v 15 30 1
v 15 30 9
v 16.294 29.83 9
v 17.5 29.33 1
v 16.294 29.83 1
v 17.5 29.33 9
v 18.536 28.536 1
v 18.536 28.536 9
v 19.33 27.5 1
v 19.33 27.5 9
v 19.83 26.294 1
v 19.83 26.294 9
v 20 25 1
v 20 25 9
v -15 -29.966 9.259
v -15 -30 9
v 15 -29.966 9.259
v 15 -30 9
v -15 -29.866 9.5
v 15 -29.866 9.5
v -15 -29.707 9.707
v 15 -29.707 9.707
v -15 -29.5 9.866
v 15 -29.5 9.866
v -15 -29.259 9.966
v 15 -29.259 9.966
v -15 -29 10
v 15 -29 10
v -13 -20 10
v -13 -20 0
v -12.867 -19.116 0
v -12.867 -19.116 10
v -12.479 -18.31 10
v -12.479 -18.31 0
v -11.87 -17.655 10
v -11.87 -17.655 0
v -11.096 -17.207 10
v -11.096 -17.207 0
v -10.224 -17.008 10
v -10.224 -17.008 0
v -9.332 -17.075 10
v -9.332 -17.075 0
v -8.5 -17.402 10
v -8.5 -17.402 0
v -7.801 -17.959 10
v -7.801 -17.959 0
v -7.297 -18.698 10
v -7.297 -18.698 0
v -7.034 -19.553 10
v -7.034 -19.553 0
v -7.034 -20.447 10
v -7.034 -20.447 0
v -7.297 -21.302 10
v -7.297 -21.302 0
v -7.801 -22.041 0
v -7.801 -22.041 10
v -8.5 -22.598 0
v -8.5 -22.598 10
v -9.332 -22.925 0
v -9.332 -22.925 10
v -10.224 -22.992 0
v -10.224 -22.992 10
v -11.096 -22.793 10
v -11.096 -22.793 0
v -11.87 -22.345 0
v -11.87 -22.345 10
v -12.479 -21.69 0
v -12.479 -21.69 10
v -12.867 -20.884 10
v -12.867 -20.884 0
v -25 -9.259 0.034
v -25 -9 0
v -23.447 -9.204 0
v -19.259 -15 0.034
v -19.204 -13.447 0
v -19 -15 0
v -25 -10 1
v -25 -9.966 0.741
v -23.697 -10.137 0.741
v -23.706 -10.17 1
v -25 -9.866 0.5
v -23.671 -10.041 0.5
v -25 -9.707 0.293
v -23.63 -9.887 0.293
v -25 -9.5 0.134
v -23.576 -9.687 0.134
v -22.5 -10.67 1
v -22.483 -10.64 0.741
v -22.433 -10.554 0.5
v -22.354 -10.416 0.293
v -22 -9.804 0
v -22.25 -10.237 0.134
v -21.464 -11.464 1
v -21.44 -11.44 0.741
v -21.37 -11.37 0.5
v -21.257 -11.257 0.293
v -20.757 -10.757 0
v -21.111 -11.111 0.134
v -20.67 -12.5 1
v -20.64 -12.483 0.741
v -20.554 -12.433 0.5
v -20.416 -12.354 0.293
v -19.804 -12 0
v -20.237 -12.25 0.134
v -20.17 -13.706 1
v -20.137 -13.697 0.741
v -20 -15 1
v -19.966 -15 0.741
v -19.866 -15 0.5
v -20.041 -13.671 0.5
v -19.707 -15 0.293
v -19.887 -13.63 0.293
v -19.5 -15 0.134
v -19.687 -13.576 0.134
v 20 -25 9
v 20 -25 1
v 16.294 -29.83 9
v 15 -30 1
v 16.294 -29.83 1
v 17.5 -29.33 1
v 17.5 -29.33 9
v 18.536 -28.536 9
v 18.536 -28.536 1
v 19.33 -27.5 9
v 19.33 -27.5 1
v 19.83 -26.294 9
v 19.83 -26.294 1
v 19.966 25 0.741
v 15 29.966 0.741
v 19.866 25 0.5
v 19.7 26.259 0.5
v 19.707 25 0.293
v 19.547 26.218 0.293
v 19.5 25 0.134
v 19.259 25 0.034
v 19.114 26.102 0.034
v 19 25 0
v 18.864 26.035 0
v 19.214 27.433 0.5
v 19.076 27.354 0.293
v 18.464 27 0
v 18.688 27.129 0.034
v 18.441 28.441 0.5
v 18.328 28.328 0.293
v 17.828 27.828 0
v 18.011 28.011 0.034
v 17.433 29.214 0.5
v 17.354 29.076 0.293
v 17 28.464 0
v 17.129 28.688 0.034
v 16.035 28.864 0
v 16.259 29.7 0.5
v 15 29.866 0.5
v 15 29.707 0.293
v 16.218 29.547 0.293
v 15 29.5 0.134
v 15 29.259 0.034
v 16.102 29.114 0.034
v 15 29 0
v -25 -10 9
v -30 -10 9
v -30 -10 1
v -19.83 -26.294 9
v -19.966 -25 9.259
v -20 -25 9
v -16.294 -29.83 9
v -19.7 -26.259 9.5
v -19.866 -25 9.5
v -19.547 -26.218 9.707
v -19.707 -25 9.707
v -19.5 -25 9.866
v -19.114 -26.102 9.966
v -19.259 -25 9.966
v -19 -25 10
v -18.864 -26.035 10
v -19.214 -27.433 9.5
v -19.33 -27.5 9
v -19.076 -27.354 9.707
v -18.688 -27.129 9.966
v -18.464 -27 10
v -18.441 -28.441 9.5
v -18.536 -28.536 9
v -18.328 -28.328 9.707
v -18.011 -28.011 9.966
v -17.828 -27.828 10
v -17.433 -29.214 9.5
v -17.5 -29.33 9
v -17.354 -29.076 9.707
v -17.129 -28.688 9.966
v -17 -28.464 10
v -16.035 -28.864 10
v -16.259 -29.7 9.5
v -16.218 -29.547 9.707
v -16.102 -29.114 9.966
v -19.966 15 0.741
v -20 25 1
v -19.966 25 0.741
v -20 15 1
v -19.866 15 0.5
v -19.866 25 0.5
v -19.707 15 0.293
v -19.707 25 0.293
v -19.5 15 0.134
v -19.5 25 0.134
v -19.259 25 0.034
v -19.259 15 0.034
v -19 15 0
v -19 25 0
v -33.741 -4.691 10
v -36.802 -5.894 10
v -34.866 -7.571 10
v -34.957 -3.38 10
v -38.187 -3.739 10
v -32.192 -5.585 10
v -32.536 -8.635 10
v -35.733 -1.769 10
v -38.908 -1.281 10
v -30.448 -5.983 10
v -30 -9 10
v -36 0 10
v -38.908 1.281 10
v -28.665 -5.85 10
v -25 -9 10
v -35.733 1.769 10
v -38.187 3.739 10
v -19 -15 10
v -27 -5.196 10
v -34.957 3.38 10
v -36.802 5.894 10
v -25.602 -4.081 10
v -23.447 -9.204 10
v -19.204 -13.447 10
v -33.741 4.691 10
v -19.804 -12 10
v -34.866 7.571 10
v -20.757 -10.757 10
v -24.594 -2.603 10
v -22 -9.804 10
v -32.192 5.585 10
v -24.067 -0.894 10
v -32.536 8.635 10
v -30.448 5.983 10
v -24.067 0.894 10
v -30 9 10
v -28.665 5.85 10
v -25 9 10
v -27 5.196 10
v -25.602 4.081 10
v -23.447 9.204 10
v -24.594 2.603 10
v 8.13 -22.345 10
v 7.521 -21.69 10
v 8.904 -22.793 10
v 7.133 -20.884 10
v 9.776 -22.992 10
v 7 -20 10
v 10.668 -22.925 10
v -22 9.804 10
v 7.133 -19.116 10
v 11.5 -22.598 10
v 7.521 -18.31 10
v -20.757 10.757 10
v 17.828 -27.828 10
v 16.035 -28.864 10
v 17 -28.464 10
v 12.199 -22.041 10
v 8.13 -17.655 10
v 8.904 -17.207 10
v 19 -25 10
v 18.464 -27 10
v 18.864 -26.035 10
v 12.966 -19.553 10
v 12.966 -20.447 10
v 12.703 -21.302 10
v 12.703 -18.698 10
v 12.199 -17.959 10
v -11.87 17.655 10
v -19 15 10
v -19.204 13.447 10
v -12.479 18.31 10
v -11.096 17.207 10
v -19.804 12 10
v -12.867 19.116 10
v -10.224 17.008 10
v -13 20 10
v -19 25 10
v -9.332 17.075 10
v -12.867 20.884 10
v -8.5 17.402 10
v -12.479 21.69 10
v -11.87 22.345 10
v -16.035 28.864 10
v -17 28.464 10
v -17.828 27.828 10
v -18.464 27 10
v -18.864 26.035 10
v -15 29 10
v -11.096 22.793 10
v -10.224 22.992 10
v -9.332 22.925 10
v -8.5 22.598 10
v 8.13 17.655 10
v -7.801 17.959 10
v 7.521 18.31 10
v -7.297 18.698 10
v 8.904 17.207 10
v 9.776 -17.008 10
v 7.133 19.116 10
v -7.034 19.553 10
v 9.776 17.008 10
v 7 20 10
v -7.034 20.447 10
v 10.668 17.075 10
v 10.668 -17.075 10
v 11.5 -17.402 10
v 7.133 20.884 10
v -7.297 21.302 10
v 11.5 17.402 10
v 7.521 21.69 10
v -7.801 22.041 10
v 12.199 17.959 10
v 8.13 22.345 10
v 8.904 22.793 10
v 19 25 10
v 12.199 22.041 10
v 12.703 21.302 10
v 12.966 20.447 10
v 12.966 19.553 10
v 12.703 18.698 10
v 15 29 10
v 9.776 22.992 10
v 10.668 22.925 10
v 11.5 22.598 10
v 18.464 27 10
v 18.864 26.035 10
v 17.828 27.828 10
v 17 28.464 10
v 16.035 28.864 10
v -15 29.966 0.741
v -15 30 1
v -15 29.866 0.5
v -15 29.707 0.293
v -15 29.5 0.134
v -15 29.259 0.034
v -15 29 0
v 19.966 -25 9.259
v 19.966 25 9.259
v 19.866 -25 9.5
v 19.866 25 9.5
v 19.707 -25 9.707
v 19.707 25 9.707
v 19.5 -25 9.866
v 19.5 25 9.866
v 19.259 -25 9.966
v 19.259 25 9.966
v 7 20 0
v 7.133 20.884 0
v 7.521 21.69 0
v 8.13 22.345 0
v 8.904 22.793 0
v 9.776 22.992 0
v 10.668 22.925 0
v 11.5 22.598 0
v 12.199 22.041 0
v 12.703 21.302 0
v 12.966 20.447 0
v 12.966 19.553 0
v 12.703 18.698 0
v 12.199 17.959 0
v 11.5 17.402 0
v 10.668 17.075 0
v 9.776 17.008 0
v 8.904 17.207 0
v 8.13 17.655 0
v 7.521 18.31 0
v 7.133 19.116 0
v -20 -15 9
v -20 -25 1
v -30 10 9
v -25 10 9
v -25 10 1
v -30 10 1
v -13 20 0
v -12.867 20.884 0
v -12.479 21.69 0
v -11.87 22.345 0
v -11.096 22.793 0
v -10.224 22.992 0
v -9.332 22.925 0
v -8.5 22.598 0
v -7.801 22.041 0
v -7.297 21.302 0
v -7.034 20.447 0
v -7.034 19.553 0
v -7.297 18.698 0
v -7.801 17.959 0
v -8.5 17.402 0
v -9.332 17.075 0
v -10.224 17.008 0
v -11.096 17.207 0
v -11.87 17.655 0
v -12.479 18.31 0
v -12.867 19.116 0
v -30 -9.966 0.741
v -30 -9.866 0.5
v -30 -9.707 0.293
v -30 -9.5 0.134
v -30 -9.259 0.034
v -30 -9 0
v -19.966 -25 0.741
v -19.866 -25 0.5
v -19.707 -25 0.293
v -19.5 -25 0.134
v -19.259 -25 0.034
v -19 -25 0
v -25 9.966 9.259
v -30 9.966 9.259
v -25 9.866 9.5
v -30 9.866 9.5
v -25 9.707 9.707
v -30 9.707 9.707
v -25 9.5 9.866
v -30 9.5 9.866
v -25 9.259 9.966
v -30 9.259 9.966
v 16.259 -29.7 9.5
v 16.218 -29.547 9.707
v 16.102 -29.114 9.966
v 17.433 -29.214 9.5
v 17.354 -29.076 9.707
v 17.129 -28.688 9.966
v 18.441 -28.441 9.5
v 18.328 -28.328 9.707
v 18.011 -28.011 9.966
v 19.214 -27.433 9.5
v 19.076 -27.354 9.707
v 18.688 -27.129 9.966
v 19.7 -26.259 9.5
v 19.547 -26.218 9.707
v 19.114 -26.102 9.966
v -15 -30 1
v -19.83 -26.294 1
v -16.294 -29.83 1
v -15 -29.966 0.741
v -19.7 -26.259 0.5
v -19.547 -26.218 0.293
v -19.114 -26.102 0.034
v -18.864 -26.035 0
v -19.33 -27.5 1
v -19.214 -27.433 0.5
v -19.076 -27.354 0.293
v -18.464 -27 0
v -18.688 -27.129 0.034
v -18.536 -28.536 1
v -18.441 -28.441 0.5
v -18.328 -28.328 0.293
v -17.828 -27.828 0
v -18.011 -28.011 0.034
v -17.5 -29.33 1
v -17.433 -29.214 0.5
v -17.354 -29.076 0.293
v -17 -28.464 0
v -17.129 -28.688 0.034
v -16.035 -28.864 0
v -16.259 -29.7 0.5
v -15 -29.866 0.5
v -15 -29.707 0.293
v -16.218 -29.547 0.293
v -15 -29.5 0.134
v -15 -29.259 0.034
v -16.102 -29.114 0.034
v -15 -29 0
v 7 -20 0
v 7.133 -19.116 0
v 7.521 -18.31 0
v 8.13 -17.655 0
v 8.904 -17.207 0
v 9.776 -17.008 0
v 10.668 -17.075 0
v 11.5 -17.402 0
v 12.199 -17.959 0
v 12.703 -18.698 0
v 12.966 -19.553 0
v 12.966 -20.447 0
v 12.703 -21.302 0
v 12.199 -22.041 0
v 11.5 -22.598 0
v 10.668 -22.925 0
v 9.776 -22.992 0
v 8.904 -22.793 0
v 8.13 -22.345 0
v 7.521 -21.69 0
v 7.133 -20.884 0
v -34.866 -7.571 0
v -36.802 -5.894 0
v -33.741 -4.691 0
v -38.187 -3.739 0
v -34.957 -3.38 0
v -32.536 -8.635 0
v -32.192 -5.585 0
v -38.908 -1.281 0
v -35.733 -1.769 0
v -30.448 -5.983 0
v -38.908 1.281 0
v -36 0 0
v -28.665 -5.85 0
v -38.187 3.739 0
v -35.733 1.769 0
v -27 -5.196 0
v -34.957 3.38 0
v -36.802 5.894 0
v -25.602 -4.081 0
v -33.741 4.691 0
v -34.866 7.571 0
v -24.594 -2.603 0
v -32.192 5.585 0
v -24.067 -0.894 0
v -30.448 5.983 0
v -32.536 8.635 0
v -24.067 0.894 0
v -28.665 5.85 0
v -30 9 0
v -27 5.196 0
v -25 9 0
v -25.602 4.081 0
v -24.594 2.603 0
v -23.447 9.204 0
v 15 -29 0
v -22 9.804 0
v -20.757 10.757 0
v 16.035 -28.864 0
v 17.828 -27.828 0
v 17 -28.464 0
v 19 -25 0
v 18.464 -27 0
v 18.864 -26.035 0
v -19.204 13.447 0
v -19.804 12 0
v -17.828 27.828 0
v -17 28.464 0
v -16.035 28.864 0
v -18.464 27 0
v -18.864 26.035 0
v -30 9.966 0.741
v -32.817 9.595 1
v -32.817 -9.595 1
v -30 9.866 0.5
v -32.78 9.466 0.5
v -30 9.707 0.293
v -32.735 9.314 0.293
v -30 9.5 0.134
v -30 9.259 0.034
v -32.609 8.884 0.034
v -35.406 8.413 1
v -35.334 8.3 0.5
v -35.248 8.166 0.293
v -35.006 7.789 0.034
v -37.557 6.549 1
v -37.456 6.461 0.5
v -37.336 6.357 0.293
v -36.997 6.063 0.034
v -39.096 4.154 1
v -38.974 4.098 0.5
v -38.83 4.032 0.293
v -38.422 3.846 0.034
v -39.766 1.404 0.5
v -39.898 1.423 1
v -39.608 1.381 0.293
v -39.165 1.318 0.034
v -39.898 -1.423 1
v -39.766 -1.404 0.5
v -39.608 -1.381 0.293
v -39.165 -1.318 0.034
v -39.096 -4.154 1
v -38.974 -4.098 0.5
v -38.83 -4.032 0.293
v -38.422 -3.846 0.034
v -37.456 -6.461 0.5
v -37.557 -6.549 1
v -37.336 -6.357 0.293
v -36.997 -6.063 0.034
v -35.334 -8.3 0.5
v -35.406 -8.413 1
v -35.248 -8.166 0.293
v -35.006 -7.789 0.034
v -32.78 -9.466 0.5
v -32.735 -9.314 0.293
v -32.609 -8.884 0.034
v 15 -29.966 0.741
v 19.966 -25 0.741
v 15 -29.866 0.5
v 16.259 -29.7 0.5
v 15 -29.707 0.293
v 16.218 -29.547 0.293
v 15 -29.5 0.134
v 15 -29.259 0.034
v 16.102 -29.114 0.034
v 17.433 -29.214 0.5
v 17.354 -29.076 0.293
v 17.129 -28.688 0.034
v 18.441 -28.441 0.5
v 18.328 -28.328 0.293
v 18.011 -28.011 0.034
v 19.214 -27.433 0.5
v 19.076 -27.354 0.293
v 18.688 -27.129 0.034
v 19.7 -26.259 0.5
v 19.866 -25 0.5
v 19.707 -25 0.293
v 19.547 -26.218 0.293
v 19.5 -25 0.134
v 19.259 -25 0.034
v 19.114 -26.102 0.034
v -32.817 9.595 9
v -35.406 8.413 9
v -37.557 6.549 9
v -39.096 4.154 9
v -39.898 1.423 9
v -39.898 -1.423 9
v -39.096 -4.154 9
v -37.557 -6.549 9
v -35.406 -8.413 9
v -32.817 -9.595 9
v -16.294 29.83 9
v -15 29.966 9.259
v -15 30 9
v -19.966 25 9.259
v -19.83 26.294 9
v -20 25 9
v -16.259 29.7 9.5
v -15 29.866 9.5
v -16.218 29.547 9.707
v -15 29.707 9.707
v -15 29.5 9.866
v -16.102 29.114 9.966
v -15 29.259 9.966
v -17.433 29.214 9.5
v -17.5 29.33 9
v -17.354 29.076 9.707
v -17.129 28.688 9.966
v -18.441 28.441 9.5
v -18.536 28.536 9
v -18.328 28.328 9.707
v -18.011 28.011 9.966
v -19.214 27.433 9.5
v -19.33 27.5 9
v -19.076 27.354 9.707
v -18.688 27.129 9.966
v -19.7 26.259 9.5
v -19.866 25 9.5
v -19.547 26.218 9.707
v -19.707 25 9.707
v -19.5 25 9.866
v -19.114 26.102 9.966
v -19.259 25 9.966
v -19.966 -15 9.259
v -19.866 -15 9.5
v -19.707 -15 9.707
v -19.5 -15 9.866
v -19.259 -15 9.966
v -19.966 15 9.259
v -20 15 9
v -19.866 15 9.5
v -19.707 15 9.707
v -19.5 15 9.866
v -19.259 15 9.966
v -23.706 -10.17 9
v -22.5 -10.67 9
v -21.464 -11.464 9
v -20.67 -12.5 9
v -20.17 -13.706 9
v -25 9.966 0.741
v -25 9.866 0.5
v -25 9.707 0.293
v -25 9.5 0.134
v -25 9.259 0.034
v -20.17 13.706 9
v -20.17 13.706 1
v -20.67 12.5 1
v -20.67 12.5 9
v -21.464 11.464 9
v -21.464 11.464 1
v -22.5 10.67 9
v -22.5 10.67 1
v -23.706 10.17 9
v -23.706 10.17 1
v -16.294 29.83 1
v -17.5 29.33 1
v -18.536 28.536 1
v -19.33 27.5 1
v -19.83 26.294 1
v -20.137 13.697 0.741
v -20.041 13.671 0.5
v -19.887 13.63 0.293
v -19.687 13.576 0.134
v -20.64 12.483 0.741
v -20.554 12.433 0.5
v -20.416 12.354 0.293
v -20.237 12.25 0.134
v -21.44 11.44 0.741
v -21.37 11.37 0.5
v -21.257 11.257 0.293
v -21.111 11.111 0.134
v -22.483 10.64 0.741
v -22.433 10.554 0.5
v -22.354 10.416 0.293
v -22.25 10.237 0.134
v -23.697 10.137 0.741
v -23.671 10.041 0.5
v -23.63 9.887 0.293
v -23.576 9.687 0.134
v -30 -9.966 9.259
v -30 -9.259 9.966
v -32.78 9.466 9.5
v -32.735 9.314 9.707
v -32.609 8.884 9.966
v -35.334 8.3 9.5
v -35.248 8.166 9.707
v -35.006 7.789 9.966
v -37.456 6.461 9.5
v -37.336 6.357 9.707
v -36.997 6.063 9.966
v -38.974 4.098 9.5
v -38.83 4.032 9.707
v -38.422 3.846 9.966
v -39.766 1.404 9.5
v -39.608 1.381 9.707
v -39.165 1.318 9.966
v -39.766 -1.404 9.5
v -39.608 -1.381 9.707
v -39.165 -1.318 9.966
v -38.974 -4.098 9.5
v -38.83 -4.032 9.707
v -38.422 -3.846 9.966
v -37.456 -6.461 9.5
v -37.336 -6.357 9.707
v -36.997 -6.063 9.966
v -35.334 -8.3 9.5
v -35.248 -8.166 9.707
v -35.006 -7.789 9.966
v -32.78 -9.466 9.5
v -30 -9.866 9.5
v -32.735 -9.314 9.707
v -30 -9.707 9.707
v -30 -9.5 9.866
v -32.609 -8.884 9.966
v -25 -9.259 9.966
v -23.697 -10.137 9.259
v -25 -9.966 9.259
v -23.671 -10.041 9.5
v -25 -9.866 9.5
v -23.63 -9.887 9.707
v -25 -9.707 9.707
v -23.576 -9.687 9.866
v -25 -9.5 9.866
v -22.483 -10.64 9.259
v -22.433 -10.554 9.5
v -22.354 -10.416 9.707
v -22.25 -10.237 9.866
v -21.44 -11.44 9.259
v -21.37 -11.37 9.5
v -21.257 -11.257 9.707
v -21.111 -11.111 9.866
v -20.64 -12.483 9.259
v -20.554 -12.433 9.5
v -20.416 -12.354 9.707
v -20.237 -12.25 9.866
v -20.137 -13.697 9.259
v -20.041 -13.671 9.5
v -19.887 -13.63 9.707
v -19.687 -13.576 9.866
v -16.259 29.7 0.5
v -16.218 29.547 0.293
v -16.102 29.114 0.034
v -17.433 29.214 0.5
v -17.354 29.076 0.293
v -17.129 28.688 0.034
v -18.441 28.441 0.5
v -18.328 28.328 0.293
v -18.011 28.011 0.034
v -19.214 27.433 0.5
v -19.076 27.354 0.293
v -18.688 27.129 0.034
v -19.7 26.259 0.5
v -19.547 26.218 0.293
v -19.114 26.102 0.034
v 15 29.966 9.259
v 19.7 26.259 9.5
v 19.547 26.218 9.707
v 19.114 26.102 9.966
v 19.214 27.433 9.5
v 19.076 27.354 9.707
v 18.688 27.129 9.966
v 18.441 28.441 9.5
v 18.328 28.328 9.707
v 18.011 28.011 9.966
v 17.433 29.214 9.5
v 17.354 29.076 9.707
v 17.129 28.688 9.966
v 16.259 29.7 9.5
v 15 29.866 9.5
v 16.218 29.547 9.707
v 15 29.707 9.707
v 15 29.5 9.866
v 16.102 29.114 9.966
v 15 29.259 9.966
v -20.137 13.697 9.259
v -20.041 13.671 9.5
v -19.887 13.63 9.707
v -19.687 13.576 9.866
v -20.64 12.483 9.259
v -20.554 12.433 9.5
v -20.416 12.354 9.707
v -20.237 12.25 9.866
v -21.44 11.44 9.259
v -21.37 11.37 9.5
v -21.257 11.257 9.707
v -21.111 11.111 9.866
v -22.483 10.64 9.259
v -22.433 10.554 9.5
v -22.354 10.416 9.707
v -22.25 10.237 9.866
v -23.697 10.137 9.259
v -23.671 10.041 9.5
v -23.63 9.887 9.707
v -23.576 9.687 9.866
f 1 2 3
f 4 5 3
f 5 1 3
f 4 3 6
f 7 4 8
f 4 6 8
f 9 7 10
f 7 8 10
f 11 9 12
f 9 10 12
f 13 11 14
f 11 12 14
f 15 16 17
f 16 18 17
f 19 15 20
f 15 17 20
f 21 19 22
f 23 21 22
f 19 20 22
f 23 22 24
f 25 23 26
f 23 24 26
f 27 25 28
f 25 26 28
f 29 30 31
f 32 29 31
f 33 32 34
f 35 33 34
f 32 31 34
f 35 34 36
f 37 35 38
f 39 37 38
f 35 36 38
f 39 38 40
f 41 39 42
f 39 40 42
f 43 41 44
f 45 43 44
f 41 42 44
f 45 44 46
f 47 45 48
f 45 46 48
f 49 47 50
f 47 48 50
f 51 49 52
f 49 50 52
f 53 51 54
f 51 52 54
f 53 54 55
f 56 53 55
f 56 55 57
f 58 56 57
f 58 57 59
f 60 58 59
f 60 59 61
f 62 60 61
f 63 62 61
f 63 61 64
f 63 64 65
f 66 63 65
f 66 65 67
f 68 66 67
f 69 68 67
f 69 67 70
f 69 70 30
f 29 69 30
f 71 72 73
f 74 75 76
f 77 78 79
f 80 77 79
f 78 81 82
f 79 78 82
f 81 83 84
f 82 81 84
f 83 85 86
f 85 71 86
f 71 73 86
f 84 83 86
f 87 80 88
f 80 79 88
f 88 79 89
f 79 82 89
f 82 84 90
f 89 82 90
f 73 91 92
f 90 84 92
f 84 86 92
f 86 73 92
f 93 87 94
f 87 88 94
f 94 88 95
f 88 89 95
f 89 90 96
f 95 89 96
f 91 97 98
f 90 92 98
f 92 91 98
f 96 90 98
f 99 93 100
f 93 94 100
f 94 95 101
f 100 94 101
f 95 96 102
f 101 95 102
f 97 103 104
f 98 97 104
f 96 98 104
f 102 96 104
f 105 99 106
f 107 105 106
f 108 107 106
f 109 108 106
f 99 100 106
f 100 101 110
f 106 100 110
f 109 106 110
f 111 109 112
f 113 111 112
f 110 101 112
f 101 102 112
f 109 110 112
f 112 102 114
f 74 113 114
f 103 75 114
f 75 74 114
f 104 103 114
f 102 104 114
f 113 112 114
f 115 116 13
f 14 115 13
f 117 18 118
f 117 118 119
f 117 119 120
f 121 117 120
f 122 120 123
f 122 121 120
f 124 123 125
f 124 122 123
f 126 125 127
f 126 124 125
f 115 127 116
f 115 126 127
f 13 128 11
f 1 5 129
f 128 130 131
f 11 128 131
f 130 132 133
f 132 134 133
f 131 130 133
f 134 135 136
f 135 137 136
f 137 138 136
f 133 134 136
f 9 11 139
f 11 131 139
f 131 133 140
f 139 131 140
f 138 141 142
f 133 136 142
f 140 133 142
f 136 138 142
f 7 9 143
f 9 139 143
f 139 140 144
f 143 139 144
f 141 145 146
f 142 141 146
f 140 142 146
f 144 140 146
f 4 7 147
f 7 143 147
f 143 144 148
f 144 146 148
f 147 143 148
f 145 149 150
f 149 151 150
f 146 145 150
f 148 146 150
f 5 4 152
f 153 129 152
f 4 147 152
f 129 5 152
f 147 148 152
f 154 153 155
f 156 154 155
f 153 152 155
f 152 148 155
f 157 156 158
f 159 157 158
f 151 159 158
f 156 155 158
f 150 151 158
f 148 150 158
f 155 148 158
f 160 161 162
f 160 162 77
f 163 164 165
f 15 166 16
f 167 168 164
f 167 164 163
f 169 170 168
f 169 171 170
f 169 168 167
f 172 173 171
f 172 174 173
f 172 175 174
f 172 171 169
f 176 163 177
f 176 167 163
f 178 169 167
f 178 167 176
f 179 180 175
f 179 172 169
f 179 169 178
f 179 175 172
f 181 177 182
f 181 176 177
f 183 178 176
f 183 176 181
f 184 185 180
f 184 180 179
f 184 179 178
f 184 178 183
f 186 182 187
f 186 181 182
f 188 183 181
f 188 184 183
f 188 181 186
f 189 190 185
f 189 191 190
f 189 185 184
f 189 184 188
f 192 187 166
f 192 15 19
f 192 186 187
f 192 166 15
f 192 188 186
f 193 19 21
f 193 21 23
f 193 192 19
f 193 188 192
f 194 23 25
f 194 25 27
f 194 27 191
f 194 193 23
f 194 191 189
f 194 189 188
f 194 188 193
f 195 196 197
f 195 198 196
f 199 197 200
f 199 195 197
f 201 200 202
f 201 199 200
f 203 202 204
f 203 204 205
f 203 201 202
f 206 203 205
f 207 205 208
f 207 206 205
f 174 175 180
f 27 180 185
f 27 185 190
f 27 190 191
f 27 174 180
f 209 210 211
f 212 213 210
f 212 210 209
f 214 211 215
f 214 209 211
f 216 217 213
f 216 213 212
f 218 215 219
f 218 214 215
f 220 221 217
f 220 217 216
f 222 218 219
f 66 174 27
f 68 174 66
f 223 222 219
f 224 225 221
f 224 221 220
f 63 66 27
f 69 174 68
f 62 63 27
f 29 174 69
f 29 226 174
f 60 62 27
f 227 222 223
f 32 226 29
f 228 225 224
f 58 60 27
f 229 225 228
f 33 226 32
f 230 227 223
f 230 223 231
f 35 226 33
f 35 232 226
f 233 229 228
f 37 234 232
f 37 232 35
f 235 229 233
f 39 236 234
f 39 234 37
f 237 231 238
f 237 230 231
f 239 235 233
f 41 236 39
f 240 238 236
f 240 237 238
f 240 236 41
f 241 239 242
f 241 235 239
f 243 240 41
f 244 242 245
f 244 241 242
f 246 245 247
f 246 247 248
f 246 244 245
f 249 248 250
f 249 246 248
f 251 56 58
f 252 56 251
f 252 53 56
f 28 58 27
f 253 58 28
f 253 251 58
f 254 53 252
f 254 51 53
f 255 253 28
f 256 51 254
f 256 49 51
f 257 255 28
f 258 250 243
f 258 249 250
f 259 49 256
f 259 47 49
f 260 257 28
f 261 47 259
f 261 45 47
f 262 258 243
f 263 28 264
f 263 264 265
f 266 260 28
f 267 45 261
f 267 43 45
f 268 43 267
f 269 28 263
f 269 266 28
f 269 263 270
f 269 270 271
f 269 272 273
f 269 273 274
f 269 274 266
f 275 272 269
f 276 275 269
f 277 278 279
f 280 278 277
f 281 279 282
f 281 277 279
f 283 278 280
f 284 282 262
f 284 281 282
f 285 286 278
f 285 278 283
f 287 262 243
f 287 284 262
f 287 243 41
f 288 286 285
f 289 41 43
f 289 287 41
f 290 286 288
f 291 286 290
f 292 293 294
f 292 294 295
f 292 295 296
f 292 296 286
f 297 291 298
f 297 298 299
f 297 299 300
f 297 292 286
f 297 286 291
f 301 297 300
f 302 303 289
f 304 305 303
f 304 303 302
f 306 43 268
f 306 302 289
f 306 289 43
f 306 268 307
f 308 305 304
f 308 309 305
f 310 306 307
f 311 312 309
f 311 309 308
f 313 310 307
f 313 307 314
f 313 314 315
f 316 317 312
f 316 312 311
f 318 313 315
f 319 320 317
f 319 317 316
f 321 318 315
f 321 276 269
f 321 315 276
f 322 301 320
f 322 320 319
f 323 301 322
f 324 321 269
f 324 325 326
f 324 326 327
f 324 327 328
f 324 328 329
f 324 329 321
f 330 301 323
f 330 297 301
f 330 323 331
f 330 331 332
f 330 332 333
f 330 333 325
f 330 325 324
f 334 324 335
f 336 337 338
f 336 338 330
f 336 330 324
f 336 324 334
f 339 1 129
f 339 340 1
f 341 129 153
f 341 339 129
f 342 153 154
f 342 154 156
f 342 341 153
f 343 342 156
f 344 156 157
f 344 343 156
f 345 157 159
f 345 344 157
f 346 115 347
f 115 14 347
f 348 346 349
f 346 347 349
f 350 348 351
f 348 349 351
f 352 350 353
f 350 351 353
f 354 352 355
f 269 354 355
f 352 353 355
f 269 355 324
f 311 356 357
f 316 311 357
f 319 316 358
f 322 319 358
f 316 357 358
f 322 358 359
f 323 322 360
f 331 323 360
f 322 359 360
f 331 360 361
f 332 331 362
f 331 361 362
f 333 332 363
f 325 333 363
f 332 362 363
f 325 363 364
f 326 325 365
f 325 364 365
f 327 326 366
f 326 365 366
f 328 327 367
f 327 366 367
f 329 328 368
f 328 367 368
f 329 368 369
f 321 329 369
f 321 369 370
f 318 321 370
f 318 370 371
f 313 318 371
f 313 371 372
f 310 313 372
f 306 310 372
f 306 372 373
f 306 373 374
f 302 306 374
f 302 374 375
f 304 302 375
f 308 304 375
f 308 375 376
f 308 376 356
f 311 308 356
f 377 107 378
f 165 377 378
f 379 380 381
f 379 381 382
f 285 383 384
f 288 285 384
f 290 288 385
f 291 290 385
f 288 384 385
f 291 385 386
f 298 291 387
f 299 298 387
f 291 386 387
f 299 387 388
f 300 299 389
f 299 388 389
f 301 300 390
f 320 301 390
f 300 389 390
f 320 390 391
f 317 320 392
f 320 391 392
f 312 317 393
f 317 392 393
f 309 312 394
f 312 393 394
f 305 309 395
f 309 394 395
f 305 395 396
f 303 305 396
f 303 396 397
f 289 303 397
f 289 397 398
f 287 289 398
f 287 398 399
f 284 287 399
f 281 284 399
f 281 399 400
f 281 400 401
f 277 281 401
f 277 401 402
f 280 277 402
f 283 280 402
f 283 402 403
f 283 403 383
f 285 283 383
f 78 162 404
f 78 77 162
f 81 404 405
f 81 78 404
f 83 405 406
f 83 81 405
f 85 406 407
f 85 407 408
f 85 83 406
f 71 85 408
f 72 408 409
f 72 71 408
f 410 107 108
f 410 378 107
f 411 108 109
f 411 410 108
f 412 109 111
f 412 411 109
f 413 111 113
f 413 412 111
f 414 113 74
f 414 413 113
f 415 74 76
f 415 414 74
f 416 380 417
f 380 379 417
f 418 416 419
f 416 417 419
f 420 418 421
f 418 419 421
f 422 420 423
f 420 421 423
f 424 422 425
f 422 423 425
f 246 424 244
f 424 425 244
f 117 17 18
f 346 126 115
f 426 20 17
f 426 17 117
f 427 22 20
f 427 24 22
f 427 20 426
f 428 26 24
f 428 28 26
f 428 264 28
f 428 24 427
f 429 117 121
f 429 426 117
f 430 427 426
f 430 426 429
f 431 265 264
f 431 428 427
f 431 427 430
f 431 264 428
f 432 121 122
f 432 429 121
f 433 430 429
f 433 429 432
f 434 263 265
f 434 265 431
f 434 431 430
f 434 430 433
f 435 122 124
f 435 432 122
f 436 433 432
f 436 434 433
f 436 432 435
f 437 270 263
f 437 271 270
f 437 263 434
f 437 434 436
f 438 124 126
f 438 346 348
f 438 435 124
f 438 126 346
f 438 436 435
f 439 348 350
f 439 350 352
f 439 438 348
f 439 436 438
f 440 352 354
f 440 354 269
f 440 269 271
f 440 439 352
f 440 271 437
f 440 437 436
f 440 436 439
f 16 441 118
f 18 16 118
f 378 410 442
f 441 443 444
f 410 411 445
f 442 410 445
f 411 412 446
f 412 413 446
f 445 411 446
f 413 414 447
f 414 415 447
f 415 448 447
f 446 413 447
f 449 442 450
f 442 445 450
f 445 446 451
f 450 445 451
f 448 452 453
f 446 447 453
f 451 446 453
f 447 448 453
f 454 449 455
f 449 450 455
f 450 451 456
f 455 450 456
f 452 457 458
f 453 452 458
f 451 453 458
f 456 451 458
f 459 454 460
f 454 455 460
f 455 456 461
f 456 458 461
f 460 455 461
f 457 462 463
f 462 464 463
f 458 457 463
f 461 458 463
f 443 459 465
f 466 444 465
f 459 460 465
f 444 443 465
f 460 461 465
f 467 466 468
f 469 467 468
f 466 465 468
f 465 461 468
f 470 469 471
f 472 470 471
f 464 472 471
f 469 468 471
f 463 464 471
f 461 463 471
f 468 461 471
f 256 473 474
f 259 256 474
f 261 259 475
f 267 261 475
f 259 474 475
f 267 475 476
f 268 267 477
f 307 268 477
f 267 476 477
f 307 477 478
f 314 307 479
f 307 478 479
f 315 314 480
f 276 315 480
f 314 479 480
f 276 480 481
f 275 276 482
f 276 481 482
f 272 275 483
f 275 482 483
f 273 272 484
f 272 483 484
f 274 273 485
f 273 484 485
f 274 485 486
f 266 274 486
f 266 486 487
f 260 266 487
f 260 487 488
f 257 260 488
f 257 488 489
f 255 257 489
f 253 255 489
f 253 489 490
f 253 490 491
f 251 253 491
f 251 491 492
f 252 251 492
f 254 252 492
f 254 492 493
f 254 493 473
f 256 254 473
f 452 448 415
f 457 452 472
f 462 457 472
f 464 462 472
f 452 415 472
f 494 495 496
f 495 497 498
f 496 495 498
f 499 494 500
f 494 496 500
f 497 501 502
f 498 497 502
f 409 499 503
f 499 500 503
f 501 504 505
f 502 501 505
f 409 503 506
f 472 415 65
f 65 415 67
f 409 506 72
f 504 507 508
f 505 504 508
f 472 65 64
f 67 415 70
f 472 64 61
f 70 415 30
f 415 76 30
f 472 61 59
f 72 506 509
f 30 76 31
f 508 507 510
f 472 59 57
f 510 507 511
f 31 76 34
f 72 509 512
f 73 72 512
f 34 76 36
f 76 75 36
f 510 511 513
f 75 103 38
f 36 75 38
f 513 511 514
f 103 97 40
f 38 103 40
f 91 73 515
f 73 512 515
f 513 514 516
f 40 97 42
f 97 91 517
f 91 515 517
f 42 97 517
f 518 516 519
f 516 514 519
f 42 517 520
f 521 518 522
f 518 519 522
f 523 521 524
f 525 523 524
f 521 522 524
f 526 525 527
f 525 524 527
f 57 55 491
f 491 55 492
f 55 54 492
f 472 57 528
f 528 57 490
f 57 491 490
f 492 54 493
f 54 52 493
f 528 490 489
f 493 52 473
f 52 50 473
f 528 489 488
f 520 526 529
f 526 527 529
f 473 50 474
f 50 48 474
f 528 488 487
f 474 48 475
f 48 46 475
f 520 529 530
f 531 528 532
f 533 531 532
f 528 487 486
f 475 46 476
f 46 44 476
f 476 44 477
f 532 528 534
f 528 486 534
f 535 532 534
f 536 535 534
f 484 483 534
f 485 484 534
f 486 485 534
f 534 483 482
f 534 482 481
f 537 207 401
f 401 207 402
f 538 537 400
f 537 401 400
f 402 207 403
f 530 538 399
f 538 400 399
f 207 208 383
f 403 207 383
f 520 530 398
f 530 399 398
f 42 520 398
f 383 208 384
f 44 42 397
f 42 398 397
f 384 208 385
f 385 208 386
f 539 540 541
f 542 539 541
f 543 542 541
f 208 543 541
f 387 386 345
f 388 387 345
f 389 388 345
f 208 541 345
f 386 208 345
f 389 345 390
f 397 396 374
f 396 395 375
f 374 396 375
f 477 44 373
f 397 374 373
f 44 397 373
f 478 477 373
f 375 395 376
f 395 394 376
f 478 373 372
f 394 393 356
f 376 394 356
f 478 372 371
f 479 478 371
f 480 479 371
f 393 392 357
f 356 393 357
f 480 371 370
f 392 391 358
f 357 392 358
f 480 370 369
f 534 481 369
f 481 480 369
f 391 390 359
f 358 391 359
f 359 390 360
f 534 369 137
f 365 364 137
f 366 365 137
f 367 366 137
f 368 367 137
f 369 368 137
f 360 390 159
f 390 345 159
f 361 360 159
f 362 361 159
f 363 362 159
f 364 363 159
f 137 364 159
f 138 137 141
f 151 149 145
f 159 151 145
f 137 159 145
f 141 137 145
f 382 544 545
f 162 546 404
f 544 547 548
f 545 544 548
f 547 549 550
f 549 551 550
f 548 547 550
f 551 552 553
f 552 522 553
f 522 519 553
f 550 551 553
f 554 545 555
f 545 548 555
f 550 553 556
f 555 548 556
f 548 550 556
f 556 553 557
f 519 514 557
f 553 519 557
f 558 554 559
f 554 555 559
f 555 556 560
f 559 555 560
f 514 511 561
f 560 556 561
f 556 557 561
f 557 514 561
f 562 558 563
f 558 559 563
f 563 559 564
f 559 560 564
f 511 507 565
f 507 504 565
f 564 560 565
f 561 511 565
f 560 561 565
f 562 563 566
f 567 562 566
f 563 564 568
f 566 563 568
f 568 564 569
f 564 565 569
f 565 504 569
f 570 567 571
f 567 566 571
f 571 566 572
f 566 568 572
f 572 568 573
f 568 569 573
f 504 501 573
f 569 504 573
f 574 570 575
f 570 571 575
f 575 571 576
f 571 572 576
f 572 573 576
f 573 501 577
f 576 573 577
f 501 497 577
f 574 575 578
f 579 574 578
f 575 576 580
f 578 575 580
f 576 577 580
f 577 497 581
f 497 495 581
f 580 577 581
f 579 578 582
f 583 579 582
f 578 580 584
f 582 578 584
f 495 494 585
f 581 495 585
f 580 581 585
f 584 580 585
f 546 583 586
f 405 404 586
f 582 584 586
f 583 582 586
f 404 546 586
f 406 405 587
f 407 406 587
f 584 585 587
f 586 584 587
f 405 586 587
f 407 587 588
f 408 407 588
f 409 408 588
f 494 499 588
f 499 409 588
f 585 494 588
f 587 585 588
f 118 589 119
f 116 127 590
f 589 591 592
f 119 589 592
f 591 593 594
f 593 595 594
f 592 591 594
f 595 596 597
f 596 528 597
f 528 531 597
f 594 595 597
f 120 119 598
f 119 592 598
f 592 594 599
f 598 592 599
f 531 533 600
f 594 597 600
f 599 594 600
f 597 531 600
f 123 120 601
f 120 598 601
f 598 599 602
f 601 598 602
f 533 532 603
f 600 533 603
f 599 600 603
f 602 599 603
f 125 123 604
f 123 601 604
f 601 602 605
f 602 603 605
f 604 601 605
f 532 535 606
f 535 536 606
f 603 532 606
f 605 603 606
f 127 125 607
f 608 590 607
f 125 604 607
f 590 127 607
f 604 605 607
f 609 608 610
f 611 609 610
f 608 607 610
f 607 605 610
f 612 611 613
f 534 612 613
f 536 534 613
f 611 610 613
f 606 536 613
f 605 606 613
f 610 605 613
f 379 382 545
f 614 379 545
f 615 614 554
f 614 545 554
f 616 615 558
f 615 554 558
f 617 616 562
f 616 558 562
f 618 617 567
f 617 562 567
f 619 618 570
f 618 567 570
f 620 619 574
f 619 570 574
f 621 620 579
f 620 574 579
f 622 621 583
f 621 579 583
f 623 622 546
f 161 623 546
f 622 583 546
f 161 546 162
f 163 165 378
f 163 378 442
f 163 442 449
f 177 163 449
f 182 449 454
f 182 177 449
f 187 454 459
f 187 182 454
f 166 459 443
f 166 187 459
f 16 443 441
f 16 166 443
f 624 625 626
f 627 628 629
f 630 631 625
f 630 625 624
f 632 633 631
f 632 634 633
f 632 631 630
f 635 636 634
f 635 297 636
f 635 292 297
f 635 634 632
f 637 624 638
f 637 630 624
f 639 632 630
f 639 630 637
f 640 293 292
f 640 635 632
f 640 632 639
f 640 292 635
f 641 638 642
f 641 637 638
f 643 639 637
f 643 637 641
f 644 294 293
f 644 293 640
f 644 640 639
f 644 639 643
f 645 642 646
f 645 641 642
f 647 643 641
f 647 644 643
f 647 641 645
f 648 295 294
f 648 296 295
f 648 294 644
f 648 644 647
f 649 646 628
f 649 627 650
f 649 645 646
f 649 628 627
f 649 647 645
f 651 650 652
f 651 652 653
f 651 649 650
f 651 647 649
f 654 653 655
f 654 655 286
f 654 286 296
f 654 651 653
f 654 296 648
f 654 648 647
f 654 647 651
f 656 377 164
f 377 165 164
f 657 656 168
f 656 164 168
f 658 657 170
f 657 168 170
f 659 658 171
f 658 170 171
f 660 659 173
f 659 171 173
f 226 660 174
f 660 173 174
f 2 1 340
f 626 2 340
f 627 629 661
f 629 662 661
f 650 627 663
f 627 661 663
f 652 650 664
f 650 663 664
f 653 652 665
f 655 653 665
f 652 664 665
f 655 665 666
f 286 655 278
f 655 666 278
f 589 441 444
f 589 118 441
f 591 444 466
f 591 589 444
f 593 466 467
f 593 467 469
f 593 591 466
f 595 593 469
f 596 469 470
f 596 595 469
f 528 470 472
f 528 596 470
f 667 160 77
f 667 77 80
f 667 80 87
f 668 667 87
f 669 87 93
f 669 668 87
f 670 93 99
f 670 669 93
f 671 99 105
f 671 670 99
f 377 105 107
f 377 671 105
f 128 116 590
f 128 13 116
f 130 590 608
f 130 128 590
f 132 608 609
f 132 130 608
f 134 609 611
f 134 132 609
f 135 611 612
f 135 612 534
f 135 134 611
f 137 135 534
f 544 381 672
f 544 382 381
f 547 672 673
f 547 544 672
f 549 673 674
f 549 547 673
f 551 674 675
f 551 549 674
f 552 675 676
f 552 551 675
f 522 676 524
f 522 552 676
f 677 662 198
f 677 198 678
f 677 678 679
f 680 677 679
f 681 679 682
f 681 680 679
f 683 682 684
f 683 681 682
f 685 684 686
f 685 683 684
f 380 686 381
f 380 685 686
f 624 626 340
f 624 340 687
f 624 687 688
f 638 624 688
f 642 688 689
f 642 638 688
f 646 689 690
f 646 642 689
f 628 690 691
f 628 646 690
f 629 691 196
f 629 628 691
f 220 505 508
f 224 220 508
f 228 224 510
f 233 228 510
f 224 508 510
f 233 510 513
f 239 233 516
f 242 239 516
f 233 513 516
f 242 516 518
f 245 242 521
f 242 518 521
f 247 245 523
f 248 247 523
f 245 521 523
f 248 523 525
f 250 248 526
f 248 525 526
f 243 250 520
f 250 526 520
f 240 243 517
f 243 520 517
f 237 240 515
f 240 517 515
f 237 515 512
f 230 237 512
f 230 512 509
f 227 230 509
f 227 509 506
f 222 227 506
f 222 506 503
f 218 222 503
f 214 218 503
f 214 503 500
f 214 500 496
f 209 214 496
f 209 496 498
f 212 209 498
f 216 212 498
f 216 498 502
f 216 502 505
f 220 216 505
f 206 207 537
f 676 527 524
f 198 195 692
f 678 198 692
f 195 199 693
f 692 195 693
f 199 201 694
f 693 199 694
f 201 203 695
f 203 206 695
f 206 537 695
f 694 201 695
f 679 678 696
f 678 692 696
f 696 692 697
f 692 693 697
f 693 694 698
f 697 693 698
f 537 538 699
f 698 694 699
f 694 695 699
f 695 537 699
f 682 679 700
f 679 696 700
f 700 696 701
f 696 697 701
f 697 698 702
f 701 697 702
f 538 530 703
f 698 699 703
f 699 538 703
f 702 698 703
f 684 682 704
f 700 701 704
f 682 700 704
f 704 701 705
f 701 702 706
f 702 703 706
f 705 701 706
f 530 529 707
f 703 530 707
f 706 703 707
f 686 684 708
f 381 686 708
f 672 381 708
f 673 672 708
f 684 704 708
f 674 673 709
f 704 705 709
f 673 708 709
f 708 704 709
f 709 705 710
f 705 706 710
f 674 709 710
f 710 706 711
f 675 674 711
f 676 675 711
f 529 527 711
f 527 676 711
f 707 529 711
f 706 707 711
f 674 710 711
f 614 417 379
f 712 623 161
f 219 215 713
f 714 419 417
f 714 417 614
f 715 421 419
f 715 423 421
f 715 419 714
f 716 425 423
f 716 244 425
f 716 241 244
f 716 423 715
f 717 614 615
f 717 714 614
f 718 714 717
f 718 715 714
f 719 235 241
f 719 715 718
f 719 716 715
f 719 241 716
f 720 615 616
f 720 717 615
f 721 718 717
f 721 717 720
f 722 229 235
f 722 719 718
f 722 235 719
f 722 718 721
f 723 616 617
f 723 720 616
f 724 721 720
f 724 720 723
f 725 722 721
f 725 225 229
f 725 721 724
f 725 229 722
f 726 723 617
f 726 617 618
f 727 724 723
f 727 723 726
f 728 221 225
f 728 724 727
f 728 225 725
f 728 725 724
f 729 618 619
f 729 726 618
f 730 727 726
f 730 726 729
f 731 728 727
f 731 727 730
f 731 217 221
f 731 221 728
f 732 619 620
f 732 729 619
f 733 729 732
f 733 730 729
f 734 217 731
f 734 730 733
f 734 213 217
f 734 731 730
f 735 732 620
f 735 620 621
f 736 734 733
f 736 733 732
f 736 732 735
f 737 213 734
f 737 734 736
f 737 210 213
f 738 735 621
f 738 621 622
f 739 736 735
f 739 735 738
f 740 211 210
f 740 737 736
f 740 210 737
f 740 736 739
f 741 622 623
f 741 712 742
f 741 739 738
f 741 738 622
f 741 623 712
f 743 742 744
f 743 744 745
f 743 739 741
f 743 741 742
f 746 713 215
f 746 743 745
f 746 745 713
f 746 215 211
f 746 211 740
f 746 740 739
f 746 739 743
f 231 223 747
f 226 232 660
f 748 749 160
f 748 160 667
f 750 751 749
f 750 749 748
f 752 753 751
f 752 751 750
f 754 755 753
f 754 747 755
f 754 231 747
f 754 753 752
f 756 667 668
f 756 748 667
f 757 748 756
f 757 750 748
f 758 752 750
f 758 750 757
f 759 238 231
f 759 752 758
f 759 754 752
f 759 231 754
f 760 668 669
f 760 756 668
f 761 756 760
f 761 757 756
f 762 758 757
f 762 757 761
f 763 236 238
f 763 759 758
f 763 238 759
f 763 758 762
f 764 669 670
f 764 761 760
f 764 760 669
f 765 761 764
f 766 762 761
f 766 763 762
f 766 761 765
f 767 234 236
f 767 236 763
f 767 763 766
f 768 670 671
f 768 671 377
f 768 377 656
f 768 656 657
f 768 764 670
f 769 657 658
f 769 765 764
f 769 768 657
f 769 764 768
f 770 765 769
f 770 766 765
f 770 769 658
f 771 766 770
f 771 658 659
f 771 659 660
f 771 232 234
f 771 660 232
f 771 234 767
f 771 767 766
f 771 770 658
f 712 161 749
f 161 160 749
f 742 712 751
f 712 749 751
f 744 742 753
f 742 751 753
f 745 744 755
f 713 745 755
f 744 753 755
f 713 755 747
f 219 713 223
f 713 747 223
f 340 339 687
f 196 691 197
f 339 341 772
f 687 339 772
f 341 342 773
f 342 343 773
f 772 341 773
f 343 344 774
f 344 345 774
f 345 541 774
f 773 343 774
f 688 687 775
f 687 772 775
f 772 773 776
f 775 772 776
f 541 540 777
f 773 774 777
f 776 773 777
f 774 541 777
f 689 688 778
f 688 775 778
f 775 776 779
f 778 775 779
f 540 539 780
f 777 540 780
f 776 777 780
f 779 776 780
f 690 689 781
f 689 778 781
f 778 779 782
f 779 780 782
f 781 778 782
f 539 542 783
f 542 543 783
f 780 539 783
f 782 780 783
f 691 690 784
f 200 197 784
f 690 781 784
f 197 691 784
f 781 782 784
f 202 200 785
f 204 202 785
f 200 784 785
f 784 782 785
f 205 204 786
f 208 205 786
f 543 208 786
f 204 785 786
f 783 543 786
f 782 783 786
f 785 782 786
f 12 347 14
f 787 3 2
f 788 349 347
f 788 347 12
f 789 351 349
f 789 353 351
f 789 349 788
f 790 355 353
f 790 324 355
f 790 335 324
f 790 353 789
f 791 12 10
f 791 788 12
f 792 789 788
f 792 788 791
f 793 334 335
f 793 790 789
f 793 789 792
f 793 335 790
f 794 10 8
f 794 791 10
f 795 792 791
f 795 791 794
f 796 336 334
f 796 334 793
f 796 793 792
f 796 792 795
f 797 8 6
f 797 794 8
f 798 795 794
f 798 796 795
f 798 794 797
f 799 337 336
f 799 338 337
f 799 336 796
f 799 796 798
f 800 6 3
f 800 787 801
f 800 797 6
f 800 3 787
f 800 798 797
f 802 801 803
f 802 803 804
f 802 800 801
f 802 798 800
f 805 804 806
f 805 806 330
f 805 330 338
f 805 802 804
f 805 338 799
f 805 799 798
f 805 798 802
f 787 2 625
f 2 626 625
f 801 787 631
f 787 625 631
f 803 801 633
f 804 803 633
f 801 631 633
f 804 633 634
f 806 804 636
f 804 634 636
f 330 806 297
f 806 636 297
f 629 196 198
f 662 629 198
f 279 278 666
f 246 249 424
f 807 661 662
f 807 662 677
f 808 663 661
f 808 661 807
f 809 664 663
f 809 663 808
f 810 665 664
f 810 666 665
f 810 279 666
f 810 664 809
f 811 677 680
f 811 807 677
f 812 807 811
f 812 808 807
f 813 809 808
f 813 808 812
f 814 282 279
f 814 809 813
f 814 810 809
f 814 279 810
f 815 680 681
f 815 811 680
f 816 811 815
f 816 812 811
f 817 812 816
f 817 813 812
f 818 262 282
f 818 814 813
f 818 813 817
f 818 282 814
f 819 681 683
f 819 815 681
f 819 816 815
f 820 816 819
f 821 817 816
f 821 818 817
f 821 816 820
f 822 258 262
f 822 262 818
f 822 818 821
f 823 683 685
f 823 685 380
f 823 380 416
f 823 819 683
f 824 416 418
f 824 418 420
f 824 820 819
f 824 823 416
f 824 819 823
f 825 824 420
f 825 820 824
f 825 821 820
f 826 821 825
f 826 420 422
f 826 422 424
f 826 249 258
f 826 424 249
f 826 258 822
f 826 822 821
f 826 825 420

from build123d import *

# Parameters (mm, degrees)
F1_DEPTH = 10
F2_R     = 5
F4_D     = 6
F6_D     = 12
F7_R     = 1


with BuildPart() as f1:
    # F0 (on Top) → F1 (new body)
    with BuildSketch(Plane.XY):
        with BuildLine():
            Line((20, 30), (-20, 30))
            Line((-20, 30), (-20, 10))
            Line((-20, 10), (-30, 10))
            ThreePointArc((-30, 10), (-40, 0), (-30, -10))
            Line((-30, -10), (-20, -10))
            Line((-20, -10), (-20, -30))
            Line((-20, -30), (20, -30))
            Line((20, -30), (20, 30))
        make_face()
    extrude(amount=F1_DEPTH)

    # F2
    f2_edges = [f1.edges().sort_by_distance(p)[0] for p in [
        (-20, 30, 5),
        (-20, -30, 5),
        (20, -30, 5),
        (20, 30, 5),
        (-20, -10, 5),
        (-20, 10, 5),
    ]]
    fillet(f2_edges, radius=F2_R)

    # F4 (through all)
    with Locations(Plane.XY.offset(10)):
        with Locations((-10, 20), (10, 20), (10, -20), (-10, -20)):
            Hole(F4_D / 2)

    # F6 (through all)
    with Locations(Plane.XY.offset(10)):
        with Locations((-30, 0)):
            Hole(F6_D / 2)

    # F7
    f7_edges = [f1.edges().sort_by_distance(p)[0] for p in [
        (0, 30, 0),
        (0, 30, 10),
    ]]
    fillet(f7_edges, radius=F7_R)


solid = f1.part
